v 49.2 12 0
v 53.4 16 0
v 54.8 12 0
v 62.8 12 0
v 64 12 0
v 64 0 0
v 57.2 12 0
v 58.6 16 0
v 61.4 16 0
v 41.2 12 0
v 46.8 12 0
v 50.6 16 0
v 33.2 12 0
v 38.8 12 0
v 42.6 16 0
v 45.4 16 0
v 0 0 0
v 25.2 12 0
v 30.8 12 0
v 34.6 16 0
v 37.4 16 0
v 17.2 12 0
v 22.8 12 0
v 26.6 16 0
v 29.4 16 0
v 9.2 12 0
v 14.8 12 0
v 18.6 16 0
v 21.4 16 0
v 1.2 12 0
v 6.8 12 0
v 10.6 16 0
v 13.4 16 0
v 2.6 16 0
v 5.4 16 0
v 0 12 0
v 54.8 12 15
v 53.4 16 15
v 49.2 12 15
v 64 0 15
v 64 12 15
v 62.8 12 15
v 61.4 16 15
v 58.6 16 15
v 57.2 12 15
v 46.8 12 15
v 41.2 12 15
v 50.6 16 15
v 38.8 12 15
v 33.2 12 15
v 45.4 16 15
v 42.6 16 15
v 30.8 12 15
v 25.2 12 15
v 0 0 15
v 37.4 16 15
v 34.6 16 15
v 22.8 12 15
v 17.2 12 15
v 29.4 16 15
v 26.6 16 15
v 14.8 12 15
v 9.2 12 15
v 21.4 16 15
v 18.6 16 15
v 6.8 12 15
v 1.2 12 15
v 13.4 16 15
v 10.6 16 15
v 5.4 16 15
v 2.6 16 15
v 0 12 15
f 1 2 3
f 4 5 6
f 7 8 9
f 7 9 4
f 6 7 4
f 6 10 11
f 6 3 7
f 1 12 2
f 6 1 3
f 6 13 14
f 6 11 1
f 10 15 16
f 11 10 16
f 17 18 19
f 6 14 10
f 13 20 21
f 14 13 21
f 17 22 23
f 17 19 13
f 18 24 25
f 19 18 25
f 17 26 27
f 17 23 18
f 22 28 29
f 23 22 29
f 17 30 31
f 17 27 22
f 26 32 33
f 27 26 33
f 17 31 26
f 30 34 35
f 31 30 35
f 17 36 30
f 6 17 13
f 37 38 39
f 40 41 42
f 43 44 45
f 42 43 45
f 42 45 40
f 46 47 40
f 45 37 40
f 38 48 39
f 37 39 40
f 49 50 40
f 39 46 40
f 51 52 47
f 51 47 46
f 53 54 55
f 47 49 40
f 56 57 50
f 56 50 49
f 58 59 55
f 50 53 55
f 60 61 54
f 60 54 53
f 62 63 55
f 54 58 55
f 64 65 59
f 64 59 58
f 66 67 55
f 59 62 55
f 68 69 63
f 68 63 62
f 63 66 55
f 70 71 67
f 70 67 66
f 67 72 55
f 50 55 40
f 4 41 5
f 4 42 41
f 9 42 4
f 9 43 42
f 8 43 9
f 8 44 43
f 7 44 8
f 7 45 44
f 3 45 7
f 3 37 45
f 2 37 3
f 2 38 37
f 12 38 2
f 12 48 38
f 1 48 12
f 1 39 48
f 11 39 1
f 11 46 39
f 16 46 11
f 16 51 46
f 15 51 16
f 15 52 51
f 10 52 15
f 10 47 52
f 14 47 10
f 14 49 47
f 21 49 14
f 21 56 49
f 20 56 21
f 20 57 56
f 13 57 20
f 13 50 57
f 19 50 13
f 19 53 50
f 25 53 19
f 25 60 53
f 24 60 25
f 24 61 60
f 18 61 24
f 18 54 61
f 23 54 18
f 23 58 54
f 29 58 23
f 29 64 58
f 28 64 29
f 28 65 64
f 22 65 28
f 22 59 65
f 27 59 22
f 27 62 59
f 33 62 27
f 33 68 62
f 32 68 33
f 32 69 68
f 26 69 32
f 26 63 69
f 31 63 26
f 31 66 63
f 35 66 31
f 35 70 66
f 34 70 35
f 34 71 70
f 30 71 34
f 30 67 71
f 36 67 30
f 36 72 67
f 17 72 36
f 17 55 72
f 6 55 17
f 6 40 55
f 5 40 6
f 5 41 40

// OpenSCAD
$fn = 32;

// ----------------------------------------------------------------------
// Gear rack: 8 teeth, pitch 8 mm
// ----------------------------------------------------------------------

// --- parameters (mm) ---
teeth = 8;                // number of teeth
pitch = 8;                // tooth pitch, X
root_w = 5.6;             // tooth width at the root
tip_w = 2.8;              // tooth width at the tip
base_h = 12;              // rack body height, Y
tooth_h = 4;              // tooth height above the body
plate_t = 15;             // rack width, Z (extrusion height)

rack_l = teeth * pitch;  // overall length
total_h = base_h + tooth_h;  // overall height

profile = [[0, 0], [64, 0], [64, 12], [62.8, 12], [61.4, 16], [58.6, 16], [57.2, 12], [54.8, 12], [53.4, 16], [50.6, 16], [49.2, 12], [46.8, 12], [45.4, 16], [42.6, 16], [41.2, 12], [38.8, 12], [37.4, 16], [34.6, 16], [33.2, 12], [30.8, 12], [29.4, 16], [26.6, 16], [25.2, 12], [22.8, 12], [21.4, 16], [18.6, 16], [17.2, 12], [14.8, 12], [13.4, 16], [10.6, 16], [9.2, 12], [6.8, 12], [5.4, 16], [2.6, 16], [1.2, 12], [0, 12]];  // primary outline, 36 points, counter clockwise

// --- the one profile operation ---
linear_extrude(height = plate_t) polygon(points = profile);
